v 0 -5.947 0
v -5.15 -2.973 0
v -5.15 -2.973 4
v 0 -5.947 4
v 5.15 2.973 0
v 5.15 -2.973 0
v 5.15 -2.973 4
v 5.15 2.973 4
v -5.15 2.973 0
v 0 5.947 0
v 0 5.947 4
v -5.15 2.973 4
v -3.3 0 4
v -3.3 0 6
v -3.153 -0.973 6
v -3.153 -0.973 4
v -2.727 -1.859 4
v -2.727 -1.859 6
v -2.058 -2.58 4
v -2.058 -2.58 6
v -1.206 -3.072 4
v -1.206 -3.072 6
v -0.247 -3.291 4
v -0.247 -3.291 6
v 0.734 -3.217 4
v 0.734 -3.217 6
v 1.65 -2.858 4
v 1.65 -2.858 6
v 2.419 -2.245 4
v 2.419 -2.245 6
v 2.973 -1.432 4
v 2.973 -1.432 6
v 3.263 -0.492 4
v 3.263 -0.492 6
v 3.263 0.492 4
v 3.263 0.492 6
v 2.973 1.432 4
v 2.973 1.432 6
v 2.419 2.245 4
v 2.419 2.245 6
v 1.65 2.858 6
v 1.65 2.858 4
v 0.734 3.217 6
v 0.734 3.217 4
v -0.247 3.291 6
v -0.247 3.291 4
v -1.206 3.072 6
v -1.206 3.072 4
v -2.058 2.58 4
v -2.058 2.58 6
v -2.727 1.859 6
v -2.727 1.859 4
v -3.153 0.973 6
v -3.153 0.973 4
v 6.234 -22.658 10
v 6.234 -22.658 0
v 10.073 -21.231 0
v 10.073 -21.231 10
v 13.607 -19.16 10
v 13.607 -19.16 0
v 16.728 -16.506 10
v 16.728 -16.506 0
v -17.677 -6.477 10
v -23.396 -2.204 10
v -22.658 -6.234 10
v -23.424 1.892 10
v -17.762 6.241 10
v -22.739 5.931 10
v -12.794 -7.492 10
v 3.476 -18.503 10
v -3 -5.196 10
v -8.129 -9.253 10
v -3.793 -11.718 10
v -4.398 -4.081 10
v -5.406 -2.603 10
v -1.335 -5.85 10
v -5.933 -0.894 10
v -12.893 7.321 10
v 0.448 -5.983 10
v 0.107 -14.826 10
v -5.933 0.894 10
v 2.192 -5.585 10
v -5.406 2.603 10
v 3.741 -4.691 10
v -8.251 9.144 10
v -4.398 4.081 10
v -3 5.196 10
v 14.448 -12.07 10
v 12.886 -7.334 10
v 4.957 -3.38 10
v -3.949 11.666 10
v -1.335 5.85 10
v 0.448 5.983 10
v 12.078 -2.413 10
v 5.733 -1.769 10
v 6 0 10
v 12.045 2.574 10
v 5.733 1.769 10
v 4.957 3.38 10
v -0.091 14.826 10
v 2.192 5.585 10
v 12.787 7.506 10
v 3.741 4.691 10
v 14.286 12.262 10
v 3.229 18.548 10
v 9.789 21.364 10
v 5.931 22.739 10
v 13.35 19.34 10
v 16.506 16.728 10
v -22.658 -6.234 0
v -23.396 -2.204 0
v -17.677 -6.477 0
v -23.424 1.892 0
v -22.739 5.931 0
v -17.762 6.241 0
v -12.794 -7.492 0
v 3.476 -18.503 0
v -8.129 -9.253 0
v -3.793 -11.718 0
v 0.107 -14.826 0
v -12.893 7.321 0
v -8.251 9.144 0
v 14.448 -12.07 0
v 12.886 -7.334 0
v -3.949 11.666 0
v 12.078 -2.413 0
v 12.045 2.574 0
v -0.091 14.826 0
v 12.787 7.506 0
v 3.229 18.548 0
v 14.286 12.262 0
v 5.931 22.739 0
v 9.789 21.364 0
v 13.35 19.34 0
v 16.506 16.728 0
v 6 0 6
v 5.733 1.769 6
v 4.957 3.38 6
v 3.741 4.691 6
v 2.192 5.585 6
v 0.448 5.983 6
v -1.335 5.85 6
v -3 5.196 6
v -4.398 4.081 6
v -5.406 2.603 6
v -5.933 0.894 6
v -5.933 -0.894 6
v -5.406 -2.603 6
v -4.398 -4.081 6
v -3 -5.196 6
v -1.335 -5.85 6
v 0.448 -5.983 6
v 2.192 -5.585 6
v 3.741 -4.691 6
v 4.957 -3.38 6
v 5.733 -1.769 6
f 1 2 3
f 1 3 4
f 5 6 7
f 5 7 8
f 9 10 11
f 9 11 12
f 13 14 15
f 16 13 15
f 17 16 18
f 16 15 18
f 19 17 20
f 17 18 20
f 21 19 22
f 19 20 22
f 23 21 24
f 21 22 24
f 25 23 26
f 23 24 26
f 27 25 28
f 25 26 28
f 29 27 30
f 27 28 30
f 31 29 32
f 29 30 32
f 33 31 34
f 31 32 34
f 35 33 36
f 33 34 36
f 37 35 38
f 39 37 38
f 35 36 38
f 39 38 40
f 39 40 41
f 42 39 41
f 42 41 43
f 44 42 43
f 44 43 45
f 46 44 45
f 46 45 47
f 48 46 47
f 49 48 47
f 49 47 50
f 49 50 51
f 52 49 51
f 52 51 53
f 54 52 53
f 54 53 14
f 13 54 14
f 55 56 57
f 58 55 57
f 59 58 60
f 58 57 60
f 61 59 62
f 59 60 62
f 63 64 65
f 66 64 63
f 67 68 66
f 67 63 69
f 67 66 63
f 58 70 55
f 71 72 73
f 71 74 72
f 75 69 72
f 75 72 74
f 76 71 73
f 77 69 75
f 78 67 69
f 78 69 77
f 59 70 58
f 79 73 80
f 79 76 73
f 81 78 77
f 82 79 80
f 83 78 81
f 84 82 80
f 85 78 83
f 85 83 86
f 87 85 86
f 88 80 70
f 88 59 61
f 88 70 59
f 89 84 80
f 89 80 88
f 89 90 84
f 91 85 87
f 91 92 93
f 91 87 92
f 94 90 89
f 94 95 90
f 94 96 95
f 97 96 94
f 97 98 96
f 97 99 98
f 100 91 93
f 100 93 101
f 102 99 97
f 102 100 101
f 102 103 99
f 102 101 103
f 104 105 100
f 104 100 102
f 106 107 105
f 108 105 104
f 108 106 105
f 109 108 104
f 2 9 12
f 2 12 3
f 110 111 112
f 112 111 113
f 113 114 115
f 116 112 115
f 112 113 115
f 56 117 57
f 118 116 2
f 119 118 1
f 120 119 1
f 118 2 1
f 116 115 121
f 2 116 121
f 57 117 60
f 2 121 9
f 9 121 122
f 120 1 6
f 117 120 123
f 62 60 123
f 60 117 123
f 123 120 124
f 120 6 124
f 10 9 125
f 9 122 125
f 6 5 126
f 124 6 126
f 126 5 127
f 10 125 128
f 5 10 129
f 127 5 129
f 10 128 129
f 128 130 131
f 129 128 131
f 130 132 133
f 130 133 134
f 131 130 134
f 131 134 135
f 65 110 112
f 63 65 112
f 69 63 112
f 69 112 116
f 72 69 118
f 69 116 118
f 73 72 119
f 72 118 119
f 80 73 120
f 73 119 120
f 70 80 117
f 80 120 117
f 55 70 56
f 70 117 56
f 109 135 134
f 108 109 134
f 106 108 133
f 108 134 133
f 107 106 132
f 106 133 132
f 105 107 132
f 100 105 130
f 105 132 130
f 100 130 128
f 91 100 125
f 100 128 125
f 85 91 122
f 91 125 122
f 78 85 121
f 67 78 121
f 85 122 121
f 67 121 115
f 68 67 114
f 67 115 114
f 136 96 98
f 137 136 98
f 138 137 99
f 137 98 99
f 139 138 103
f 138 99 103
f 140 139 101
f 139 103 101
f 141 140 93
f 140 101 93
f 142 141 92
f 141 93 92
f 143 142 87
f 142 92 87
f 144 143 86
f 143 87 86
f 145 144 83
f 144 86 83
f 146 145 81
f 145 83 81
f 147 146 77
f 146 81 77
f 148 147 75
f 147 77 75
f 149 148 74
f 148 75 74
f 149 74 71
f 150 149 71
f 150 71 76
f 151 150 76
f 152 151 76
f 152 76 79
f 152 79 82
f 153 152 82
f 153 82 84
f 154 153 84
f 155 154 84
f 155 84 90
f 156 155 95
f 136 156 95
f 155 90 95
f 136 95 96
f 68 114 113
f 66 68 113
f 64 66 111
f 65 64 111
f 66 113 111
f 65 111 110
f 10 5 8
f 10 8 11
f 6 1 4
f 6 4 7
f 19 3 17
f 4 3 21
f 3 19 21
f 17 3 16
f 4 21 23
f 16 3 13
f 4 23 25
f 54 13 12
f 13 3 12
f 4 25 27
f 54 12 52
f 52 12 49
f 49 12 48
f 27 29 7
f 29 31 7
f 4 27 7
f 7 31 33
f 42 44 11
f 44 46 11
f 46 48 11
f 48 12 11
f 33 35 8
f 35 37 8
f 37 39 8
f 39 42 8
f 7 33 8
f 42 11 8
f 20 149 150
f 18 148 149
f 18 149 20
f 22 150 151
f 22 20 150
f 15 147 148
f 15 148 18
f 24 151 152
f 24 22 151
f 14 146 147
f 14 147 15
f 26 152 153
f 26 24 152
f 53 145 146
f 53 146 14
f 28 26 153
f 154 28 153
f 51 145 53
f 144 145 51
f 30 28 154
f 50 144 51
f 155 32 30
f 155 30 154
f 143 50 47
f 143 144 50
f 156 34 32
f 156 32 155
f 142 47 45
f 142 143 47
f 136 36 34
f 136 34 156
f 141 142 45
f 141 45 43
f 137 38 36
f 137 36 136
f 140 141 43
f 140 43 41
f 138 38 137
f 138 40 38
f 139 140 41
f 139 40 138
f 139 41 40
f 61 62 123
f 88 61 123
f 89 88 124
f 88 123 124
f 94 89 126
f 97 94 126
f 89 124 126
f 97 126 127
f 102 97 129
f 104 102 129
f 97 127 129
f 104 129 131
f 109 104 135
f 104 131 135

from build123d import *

# Parameters (mm, degrees)
F1_DEPTH = 10
F2_DEPTH = 4
F3_D     = 6.6
F4_R     = 6
F4_R_2   = 3.3
F5_DEPTH = 4


with BuildPart() as f1:
    # F0 (on Top) → F1 (new body)
    with BuildSketch(Plane.XY):
        with BuildLine():
            Line((5.930585, 22.739353), (16.505714, 16.727564))
            ThreePointArc((16.505714, 16.727564), (11.613883, 20.42958), (5.930585, 22.739353))
        make_face()
        with BuildLine():
            Line((-22.65815, -6.233639), (-22.739353, 5.930585))
            ThreePointArc((-22.739353, 5.930585), (-23.499476, -0.156872), (-22.65815, -6.233639))
        make_face()
        with BuildLine():
            ThreePointArc((6.233639, -22.65815), (11.885593, -20.272708), (16.727564, -16.505714))
            Line((16.727564, -16.505714), (6.233639, -22.65815))
        make_face()
        with BuildLine():
            ThreePointArc((16.727564, -16.505714), (11.964046, 0.079867), (16.505714, 16.727564))
            Line((16.505714, 16.727564), (5.930585, 22.739353))
            ThreePointArc((5.930585, 22.739353), (-6.05119, 10.321235), (-22.739353, 5.930585))
            Line((-22.739353, 5.930585), (-22.65815, -6.233639))
            ThreePointArc((-22.65815, -6.233639), (-5.912857, -10.401101), (6.233639, -22.65815))
            Line((6.233639, -22.65815), (16.727564, -16.505714))
        make_face()
        Polygon((-5.15, 2.973354), (0, 5.946708), (5.15, 2.973354), (5.15, -2.973354), (0, -5.946708), (-5.15, -2.973354), align=None, mode=Mode.SUBTRACT)
        Polygon((5.15, 2.973354), (0, 5.946708), (-5.15, 2.973354), (-5.15, -2.973354), (0, -5.946708), (5.15, -2.973354), align=None)
    extrude(amount=F1_DEPTH)

    # F0 (on Top) → F2 (cut)
    with BuildSketch(Plane.XY):
        Polygon((5.15, 2.973354), (0, 5.946708), (-5.15, 2.973354), (-5.15, -2.973354), (0, -5.946708), (5.15, -2.973354), align=None)
    extrude(amount=F2_DEPTH, mode=Mode.SUBTRACT)

    # F3 (through all)
    with Locations(Plane(origin=(0, 0, 0), x_dir=(1, 0, 0), z_dir=(0, 0, -1))):
        with Locations((0, 0)):
            Hole(F3_D / 2)

    # F4 (on face) → F5 (cut)
    with BuildSketch(Plane.XY.offset(10)):
        Circle(F4_R)
        Circle(F4_R_2, mode=Mode.SUBTRACT)
    extrude(amount=-F5_DEPTH, mode=Mode.SUBTRACT)


solid = f1.part
